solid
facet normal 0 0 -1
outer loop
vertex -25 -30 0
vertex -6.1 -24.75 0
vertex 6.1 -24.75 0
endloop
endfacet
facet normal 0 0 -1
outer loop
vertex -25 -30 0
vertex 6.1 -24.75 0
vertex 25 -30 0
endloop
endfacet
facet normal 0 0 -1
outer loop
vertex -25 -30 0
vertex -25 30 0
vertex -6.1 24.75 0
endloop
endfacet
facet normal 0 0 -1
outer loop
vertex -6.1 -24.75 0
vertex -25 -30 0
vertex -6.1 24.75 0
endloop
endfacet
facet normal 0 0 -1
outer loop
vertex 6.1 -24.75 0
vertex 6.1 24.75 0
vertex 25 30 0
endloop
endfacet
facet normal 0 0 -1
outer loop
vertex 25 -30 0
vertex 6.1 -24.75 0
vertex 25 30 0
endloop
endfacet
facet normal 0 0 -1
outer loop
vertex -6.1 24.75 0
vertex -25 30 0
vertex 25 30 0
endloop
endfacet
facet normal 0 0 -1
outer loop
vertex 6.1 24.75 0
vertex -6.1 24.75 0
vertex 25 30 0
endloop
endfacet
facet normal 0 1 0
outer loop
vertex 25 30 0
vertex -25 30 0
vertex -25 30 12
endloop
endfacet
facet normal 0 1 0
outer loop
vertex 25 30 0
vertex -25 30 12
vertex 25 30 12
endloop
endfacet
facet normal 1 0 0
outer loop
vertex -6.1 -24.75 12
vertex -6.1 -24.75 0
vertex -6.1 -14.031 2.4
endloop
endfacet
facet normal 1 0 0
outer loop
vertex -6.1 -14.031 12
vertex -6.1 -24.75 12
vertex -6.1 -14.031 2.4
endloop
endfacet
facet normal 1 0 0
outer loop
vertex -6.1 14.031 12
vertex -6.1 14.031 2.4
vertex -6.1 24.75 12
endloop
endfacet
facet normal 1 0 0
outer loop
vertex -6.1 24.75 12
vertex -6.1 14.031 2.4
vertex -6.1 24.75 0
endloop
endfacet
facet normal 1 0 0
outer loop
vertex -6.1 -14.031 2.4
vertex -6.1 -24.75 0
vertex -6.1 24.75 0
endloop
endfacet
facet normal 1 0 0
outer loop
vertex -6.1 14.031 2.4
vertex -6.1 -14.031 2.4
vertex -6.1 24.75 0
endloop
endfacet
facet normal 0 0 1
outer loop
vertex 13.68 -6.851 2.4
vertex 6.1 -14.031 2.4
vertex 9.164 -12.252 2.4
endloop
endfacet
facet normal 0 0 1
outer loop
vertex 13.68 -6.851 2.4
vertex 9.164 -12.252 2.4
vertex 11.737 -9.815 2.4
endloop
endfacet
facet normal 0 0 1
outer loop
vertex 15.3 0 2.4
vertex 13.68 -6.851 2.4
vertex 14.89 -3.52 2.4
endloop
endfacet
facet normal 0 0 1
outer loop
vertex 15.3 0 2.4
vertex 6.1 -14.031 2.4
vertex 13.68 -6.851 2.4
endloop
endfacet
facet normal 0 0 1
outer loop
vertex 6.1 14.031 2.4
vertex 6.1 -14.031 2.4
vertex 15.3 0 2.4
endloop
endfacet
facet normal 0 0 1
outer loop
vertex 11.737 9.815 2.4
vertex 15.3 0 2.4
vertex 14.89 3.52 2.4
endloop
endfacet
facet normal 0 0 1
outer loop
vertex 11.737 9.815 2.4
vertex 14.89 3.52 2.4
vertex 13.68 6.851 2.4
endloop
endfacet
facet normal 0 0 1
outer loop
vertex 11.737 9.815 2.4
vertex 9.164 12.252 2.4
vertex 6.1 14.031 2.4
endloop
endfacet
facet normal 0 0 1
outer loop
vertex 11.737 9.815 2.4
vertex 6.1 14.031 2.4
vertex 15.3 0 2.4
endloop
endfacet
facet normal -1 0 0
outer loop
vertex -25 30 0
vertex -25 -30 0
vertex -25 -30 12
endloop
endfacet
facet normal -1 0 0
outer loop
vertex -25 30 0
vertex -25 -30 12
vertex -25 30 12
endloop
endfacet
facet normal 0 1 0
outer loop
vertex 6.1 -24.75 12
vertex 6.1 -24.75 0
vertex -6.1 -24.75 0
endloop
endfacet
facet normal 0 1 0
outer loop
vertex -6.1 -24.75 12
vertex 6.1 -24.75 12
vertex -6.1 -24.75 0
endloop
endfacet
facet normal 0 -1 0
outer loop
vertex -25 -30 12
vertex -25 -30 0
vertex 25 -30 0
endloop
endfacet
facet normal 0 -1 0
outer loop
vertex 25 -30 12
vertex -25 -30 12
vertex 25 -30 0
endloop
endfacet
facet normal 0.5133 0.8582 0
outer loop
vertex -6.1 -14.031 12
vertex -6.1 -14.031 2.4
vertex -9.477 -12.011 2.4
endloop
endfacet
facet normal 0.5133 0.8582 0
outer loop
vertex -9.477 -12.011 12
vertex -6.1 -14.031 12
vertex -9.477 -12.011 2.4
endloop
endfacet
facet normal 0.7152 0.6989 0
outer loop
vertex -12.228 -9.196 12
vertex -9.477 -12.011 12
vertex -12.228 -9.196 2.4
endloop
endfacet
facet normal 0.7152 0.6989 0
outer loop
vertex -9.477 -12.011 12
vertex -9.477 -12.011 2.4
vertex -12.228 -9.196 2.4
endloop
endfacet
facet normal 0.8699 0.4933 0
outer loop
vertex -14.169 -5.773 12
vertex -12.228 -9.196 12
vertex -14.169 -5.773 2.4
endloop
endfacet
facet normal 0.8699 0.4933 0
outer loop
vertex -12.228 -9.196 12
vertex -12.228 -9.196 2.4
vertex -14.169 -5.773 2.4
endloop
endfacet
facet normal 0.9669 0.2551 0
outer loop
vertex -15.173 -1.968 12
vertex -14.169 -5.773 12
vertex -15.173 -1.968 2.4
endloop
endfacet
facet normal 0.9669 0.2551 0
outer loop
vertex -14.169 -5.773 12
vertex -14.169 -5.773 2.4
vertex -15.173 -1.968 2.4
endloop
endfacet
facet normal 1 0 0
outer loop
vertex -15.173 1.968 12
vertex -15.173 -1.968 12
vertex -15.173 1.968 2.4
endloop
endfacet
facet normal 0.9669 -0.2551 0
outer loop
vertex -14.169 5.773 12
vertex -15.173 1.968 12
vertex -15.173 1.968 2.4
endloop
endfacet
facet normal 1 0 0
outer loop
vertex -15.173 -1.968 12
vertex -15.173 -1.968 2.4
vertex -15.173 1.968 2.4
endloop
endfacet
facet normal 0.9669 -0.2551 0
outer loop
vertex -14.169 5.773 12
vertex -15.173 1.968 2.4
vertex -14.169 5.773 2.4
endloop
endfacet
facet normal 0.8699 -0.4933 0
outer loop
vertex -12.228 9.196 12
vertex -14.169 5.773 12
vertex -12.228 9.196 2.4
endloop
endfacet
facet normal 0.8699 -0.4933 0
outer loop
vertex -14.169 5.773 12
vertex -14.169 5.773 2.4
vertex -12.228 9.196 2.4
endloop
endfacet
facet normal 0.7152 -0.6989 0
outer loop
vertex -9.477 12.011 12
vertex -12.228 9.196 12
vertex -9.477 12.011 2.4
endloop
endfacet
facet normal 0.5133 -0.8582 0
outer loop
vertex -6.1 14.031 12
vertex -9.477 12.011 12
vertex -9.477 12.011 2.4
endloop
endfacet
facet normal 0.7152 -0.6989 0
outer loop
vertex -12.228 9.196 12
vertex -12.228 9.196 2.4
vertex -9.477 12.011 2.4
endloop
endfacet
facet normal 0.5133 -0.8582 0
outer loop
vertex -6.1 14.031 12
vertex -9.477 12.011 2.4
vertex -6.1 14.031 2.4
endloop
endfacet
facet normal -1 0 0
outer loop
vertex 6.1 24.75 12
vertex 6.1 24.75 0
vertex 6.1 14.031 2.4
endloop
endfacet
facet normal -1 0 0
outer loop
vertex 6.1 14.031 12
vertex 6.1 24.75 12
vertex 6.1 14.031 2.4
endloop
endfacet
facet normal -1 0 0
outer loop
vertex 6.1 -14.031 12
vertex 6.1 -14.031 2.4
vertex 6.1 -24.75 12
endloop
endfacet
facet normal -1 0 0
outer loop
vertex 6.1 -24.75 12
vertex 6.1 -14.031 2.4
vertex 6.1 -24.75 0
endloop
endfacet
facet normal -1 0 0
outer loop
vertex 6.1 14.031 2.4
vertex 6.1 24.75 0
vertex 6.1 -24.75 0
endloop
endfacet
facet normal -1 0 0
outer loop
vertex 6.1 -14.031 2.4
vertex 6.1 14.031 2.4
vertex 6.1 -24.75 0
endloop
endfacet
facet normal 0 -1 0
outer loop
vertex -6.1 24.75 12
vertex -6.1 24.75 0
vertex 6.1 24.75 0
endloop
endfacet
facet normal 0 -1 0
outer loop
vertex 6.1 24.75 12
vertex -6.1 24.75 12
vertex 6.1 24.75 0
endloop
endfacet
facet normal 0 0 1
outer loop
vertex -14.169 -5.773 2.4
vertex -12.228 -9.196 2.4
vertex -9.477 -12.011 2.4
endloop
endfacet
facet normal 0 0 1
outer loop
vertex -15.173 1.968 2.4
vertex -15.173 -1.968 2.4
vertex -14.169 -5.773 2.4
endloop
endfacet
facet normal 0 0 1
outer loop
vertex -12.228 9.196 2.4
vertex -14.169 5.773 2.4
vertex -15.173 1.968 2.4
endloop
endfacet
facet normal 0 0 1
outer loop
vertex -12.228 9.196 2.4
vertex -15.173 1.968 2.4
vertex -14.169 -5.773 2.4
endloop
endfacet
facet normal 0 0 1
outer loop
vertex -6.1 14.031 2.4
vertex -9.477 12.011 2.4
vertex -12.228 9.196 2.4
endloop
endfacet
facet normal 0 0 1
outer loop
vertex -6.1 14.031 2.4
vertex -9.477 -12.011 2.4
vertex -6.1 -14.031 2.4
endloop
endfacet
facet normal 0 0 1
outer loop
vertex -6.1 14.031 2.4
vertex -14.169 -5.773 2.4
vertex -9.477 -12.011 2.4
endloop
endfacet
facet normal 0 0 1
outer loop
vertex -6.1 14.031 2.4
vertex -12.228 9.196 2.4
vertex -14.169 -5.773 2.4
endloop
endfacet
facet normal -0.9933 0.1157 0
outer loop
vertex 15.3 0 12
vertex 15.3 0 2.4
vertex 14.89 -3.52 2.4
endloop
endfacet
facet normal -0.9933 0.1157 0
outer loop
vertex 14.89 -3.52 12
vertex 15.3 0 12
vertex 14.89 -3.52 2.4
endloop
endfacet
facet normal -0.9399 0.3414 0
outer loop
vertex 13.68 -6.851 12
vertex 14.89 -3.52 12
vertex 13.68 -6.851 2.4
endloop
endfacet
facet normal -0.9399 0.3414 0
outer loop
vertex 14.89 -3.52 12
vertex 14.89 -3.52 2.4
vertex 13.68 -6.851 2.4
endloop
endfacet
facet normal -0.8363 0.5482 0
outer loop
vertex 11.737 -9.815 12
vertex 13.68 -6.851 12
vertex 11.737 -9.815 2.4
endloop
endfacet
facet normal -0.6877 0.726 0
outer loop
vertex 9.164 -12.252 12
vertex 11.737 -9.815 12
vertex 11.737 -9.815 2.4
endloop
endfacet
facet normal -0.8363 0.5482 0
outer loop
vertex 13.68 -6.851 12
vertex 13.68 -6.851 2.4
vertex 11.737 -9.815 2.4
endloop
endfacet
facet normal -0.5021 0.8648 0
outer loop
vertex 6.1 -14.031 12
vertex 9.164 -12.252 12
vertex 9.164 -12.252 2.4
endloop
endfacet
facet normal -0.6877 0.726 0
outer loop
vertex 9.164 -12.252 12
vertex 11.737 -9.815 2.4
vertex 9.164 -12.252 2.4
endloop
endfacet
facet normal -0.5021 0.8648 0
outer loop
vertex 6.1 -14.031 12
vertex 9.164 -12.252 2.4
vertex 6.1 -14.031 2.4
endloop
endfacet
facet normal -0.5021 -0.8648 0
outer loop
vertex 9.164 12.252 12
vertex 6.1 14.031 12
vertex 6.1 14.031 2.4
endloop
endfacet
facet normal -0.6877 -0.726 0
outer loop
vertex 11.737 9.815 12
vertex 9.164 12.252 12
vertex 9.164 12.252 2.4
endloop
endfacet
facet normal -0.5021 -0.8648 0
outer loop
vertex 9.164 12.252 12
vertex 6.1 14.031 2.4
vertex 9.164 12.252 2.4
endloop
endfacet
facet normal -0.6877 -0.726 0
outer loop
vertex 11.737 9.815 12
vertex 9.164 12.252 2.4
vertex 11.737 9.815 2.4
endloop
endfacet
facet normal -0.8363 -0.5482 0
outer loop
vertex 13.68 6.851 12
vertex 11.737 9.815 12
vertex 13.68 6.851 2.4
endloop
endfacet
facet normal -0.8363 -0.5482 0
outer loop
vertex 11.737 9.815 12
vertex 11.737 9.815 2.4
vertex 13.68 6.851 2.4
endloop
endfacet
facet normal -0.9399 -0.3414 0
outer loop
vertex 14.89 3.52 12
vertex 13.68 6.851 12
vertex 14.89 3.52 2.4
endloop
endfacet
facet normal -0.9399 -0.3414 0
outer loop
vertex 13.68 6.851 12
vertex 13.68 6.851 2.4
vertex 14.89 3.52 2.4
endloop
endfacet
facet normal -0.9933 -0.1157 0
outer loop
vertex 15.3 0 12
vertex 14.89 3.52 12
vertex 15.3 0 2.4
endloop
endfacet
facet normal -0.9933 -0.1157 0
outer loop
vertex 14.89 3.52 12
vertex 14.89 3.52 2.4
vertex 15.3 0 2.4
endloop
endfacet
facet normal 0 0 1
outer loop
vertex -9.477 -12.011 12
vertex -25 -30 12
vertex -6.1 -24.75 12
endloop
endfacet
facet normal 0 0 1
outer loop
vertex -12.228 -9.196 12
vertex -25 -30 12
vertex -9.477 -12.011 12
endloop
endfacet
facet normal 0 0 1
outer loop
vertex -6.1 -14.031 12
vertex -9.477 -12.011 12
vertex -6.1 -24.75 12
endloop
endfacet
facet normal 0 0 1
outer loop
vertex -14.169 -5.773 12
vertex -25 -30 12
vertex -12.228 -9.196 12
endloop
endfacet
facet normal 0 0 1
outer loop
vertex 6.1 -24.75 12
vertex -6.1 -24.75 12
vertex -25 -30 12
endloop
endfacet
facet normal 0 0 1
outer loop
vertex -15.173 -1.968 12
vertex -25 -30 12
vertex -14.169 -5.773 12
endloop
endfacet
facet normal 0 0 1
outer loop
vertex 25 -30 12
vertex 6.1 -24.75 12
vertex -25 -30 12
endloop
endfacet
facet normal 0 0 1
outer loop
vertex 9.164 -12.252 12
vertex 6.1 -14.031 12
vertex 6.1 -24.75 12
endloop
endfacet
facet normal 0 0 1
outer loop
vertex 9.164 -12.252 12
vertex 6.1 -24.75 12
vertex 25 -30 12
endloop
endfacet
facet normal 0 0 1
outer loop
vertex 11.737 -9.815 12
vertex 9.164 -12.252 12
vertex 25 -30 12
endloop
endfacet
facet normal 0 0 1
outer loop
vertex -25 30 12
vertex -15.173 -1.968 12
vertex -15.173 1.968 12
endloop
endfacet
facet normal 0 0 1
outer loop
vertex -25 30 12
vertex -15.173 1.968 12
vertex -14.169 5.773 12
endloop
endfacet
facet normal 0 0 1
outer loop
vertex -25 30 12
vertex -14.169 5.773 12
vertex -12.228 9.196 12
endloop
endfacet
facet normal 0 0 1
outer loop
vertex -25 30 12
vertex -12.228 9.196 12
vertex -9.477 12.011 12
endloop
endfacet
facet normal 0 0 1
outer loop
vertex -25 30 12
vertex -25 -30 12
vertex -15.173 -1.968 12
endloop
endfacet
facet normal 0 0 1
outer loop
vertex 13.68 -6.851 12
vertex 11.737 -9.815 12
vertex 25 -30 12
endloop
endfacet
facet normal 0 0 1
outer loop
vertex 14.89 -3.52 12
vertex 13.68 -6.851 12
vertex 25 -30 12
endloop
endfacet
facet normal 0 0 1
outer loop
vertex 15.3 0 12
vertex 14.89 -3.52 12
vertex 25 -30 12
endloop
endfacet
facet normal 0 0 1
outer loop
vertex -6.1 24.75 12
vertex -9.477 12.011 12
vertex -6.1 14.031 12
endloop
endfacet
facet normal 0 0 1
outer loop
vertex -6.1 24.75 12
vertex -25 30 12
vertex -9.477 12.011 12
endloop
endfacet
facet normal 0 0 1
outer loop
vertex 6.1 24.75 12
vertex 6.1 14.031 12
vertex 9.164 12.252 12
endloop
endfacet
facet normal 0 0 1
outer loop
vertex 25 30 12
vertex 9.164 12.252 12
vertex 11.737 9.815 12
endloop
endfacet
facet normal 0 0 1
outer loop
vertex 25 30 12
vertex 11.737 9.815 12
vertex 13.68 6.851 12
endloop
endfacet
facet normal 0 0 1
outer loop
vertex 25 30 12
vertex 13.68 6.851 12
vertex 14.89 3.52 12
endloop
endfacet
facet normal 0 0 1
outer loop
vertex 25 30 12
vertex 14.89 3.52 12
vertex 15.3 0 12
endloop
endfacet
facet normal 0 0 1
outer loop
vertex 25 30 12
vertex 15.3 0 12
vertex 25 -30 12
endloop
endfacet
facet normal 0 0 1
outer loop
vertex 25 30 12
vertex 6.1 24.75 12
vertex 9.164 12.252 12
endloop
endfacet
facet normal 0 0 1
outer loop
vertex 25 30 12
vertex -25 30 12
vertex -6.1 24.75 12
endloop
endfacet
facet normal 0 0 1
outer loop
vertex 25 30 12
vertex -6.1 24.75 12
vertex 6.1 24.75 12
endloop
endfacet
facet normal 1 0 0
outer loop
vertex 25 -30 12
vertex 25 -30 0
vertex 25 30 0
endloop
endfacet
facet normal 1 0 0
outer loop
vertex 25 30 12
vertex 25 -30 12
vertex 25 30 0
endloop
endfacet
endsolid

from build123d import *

# Parameters (mm, degrees)
F0_W     = 50
F0_H     = 60
F1_DEPTH = 12
F2_DEPTH = 2.4


with BuildPart() as f1:
    # F0 (on Top) → F1 (new body)
    with BuildSketch(Plane.XY):
        Rectangle(F0_W, F0_H)
        with BuildLine():
            Line((6.1, -14.0313933734), (6.1, -24.75))
            Line((6.1, -24.75), (-6.1, -24.75))
            Line((-6.1, -24.75), (-6.1, -14.0313933734))
            ThreePointArc((-6.1, -14.0313933734), (-15.3, 0), (-6.1, 14.0313933734))
            Line((-6.1, 14.0313933734), (-6.1, 24.75))
            Line((-6.1, 24.75), (6.1, 24.75))
            Line((6.1, 24.75), (6.1, 14.0313933734))
            ThreePointArc((6.1, 14.0313933734), (12.7949208673, 8.3892788725), (15.3, 0))
            ThreePointArc((15.3, 0), (12.7949208673, -8.3892788725), (6.1, -14.0313933734))
        make_face(mode=Mode.SUBTRACT)
    extrude(amount=F1_DEPTH)

    # F0 (on Top) → F2 (join)
    with BuildSketch(Plane.XY):
        with BuildLine():
            ThreePointArc((-6.1, 14.0313933734), (-15.3, 0), (-6.1, -14.0313933734))
            Line((-6.1, -14.0313933734), (-6.1, 14.0313933734))
        make_face()
        with BuildLine():
            Line((6.1, 14.0313933734), (6.1, -14.0313933734))
            ThreePointArc((6.1, -14.0313933734), (12.7949208673, -8.3892788725), (15.3, 0))
            ThreePointArc((15.3, 0), (12.7949208673, 8.3892788725), (6.1, 14.0313933734))
        make_face()
    extrude(amount=F2_DEPTH)


solid = f1.part
